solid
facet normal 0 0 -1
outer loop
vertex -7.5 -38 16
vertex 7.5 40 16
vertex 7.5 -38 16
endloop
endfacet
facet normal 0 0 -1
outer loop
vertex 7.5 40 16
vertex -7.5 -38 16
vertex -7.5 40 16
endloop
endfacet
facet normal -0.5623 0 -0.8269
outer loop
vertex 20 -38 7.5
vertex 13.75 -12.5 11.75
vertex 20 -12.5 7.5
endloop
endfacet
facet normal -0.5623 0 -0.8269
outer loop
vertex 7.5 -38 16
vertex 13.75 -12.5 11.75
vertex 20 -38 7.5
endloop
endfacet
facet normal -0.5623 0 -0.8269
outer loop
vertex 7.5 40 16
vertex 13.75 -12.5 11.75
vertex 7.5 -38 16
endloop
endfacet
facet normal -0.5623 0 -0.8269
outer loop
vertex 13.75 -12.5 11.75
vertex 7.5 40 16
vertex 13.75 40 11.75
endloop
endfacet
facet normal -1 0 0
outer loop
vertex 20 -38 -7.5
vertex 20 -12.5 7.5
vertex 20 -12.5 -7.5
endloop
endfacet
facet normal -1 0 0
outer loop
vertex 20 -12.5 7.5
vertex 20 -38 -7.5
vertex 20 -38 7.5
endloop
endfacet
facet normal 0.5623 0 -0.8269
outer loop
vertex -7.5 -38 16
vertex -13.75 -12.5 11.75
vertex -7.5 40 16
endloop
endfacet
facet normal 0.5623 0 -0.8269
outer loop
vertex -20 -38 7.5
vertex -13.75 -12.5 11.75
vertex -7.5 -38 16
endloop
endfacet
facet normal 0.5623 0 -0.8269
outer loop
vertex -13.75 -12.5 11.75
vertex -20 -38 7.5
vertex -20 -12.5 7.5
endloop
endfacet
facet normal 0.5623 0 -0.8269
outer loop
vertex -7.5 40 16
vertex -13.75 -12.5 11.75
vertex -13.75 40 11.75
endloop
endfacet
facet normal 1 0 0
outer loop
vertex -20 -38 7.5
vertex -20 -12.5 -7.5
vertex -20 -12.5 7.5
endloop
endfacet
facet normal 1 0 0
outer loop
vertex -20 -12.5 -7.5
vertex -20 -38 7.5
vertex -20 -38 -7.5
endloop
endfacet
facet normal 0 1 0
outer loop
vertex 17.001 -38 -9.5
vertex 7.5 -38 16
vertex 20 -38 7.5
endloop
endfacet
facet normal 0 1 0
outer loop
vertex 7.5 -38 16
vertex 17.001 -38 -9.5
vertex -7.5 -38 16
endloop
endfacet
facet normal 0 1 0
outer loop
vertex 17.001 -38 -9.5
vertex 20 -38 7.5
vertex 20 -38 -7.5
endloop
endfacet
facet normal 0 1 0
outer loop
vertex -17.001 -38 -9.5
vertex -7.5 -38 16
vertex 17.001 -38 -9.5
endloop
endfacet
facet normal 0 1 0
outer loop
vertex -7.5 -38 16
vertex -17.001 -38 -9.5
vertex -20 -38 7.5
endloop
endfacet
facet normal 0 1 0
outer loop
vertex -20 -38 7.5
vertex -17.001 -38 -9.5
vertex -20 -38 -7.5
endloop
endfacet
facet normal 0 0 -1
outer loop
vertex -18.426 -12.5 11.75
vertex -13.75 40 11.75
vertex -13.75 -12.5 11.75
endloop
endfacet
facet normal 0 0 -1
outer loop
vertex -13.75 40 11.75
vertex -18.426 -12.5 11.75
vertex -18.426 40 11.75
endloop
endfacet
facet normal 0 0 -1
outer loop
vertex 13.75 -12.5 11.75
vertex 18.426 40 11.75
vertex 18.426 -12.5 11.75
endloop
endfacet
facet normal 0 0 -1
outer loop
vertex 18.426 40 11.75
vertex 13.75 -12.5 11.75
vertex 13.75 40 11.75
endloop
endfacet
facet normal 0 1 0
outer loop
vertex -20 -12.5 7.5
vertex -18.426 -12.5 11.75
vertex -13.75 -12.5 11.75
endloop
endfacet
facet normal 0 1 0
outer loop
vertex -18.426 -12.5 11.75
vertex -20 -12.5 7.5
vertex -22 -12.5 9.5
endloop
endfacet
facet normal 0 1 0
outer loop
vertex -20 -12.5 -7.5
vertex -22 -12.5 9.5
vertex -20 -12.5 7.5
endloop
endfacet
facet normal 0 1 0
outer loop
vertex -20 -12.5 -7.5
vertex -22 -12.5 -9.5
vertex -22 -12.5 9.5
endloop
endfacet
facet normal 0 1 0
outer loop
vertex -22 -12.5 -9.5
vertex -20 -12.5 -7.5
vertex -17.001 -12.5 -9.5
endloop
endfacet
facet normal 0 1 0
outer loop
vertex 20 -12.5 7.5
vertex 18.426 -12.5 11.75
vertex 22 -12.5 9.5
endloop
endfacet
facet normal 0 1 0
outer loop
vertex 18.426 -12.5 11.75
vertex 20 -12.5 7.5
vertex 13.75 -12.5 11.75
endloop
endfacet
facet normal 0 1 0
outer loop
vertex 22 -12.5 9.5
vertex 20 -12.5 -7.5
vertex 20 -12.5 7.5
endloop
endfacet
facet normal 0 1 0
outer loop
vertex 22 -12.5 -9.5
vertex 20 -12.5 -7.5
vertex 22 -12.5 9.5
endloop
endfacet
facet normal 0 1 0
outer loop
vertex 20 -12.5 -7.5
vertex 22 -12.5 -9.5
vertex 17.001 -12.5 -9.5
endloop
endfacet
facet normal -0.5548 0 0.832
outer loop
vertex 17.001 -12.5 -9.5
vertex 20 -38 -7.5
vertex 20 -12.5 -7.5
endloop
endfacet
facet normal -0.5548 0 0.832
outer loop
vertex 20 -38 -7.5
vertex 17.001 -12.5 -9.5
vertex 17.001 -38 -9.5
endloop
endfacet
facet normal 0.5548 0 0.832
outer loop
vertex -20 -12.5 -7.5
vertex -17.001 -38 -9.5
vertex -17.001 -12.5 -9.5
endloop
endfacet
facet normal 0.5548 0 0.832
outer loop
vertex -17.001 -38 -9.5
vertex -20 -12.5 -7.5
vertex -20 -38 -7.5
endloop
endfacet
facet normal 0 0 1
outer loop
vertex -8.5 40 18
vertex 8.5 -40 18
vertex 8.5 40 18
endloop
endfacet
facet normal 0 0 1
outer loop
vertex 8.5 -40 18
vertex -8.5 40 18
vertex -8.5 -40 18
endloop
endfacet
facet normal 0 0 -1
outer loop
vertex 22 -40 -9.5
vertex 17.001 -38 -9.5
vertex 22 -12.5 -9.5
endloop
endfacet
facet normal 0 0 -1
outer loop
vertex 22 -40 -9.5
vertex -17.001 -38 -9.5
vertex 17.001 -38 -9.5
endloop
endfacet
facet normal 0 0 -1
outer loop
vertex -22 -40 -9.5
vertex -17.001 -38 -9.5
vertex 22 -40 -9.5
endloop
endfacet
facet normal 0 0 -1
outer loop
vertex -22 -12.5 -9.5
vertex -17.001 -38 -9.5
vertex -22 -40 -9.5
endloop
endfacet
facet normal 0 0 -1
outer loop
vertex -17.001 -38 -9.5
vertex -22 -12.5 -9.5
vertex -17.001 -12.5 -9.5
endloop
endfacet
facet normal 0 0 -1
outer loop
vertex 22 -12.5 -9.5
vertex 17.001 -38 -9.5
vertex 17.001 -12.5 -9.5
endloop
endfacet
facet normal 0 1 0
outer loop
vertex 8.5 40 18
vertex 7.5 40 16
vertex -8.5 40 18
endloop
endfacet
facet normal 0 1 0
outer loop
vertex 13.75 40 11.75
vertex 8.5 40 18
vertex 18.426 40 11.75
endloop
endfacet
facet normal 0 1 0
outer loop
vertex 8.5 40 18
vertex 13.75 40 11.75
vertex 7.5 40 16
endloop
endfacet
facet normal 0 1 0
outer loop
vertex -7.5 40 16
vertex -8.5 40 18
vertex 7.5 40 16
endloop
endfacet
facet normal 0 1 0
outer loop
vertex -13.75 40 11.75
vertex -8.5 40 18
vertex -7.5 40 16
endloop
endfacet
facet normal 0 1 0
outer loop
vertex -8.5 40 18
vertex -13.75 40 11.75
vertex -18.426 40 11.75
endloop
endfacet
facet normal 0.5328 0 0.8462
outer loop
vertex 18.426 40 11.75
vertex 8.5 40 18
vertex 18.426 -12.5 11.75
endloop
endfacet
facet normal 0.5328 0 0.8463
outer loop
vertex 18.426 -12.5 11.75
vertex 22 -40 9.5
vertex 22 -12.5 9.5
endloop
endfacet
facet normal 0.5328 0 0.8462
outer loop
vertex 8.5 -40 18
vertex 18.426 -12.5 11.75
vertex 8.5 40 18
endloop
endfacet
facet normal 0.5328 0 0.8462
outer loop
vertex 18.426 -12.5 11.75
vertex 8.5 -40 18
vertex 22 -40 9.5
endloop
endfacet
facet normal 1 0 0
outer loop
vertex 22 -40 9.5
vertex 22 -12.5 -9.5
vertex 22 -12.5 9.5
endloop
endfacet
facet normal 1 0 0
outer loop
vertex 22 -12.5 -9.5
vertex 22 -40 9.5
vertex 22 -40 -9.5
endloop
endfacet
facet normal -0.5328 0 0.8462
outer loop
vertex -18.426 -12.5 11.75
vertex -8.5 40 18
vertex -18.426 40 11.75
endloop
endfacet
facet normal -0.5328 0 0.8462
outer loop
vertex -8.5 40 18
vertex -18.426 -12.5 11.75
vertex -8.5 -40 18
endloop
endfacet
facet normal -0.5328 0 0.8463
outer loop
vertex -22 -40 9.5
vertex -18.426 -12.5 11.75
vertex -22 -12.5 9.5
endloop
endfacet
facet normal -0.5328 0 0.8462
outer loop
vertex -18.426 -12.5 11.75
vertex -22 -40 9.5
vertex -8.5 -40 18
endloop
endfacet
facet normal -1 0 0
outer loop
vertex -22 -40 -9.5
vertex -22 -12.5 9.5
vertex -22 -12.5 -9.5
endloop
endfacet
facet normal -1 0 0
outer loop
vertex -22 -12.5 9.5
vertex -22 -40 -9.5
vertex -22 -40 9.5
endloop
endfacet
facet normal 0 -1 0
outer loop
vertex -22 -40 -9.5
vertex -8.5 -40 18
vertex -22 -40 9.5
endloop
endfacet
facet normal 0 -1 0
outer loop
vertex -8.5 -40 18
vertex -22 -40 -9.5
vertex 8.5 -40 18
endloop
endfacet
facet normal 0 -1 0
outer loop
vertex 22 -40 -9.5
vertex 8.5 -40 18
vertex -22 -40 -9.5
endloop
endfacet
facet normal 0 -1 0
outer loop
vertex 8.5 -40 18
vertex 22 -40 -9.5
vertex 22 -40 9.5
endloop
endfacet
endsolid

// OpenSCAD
//use <./sc.scad>
t=2;
w1=40;
w2=15;
h1=15;
h2=16;
d1=20;
d2=80;
D(){hull(){
    Cu(w1+2*t,d2,h1+2*t);Tz(h2-h1/2)Cu(w2+t,d2,h1+2*t);}
    Ty(t)hull(){Cu(w1,d2,h1);Tz(h2-h1/2)Cu(w2,d2,h1);}
    Ty(d1)Cu(w1+3*t,d2-h1,h2+h1/2);
    T(0,t,-h1/2-t)hull(){Cu(w1-3*t,d2,0.001);Tz(t)Cu(w1,d2,0.001);}
    }
    
    // ShortCuts.scad 
// Autor: Rudolf Huttary, Berlin 2015
//
$fn = 50; 


//show_examples(); 

module show_examples()
	place_in_rect(30, 30)
	{
		Cy(h = 10); 
		CyH(h = 10); 
		CyH(h = 10, w = 30); 
		CyS(h = 10); 
		CyS(h = 10, w1 = 25, w2 = 75); 
		Cu(10); 
		Ri(h = 10); 
		RiH(h = 10); 
		RiS(h = 10, w1 = 10); 
		RiS(h = 10, w1 = 30, w2 = 300); 
		Sp(); 
		SpH(10, 30, 30); 
	}



module help()
{
echo("==============="); 
echo("help(): shows this help"); 
echo("show_examples(): shows some examples"); 
echo("place_in_rect(): places children objects in grid"); 
echo("Transformations:"); 
echo(" transform :  T(x=0, y=0, z=0), Tx(x=0) , Ty(y=0), Tz(z=0)"); 
echo(" rotate :  R(x=0, y=0, z=0), Rx(x=0) , Ry(y=0), Rz(z=0)"); 
echo(" scale :  S(x=1, y=1, z=1), Sx(x=1) , Sy(y=1), Sz(z=1)"); 
echo("Logical"); 
echo(" difference :  D()"); 
echo(" union :  U()"); 
echo(" intersection : *missing*"); 
echo("Primitives"); 
echo(" circle :  Ci(r=10)"); 
echo(" circle_half :  CiH(r=10, w=0)")
echo(" circle_segment :  CiS(r=10, w1=0, w2=90)")
echo(" square :  Sq(x=10, y=0, center=true))"); 
echo(" cylinder :  Cy(r=10, h=1, center=true)"); 
echo(" cylinder_half :  CyH(r=10, w=0)")
echo(" cylinder_segment: CyS(r=10, h=1, w1=0, w2=90,center=true)"); 
echo(" cylinder_segment: Pie(r=10, h=1, w1=0, w2=90,center=true)"); 
echo(" cube :  Cu(x=10, y=0, z=10, center=true)"); 
echo(" ring :  Ri(R=10, r=5, h=1, center=true)"); 
echo(" ring_half :  RiH(R=10, r=5, h=1, w=0 center=true)"); 
echo(" ring_segment :  RiS(R=10, r=5, h=1, w1=0, w2=90, center=true)"); 
echo(" sphere:  Sp(r=10))"); 
echo(" sphere_half:  SpH(r=10, w1 = 0, w2 = 0))"); 
echo("==============="); 
}


// Euclidean Transformations

module T(x=0, y=0, z=0){translate([x, y, z])children(); }
module Tx(x) { translate([x, 0, 0])children(); }
module Ty(y) { translate([0, y, 0])children(); }
module Tz(z) { translate([0, 0, z])children(); }


module R(x=0, y=0, z=0){rotate([x, y, z]) children();}
module Rx(x=90){rotate([x, 0, 0]) children();}
module Ry(y=90){rotate([0, y, 0]) children();}
module Rz(z=90){rotate([0, 0, z]) children();}

module S(x=1, y=1, z=1){scale([x, y, z]) children();}
module Sx(x=1){scale([x, 1, 1]) children();}
module Sy(y=1){scale([1, y, 1]) children();}
module Sz(z=1){scale([1, 1, z]) children();}


module D() difference(){children(0); children([1:$children-1]);}
module U() children([0:$children-1]);
// module I() intersection()children([0:$children-1]); // does not work for some reason


// primitives - 2D

module Sq(x =10, y = 0, center = true)
{
   if(y==0)
		square([x, x], center = center); 
	else
		square([x, y], center = center); 
}
module Ci(r = 10)
{
	circle(r = r); 
}

// derived primitives - 2d
module CiH(r = 10, w = 0)
  circle_half(r, w); 

module CiS(r = 10, w1 = 0, w2 = 90)
  circle_segment(r, w1, w2); 


// primitives - 3d
module Cy(r = 10, h = 1, center = true)
{
	cylinder(r = r, h = h, center = center); 
}
module Cu(x = 10, y = 0, z = 10, center = true)
{
  if (y==0)
	cube([x, x, x], center = center); 
  else
	cube([x, y, z], center = center); 
}

// derived primitives - 3d
module CyH(r = 10, h = 1, w = 0, center = true)
  cylinder_half(r, h, w, center); 

module CyS(r = 10, h = 1, w1 = 0, w2 = 90, center = true)
  cylinder_segment(r, h, w1, w2, center); 

module Ri(R = 10, r = 5, h = 1, center = true)
  ring(R, r, h, center); 

module RiS(R = 10, r = 5, h = 1, w1 = 0, w2 = 90, center = true)
   ring_segment(R, r, h, w1, w2, center); 

module RiH(r1 = 10, r2, h = 1, w = 0, center = true)
   ring_half(r1, r2, h, w, center); 
module Pie(r = 10, h = 1, w1 = 0, w2 = 90, center = true)
  cylinder_segment(r, h, w1, w2, center);  
module Sp(r = 10)
  sphere(r); 
module SpH(r = 10, w1 = 0, w2 = 0)
  sphere_half(r, w1, w2); 
module SpS(r = 10, w1 = 0, w2 = 90, w3 = 90)
  sphere_segment(r, w1, w2); 




// clear text definitions
module circle_half(r = 10, w = 0)
{
	difference()
	{
		circle(r); 
     rotate([0, 0, w-90])
     translate([0, -r])
		square([r, 2*r], center = false); 
	}
}

module circle_segment(r = 10, w1 = 0, w2 = 90)
{
  W2 = (w1>w2)?w2+360:w2; 
  if (W2-w1 < 180)
    intersection()
		{
       circle_half(r, w1); 
       circle_half(r, W2-180); 
 		}
	else
    union()
		{
       circle_half(r, w1); 
       circle_half(r, W2-180); 
 		}
}

module cylinder_half(r = 10, h = 1, w = 0, center = true)
{
  linear_extrude(height = h, center = center)
  circle_half(r, w); 
} 

module cylinder_segment(r = 10, h = 1, w1 = 0, w2 = 90, center = true)
{
  linear_extrude(height = h, center = center)
  circle_segment(r, w1, w2); 
} 

module ring(R = 10, r = 5, h = 1, center = true)
{
	difference()
	{
	cylinder(r = R, h = h, center = center); 
   translate([0, 0, -2*h])
	cylinder(r = r, h = 4*h, center = false); 
	}
}

module ring_half(R = 10, r = 5, h = 1, w = 0, center = true)
{
	difference()
	{
		ring(R, r, h, center); 
     rotate([0, 0, w])
     translate([0, -R/2, 0])
		cube([2*R, R, 3*h], center = true); 
	}
}

module ring_segment(R = 10, r = 5, h = 1, w1 = 0, w2 = 90, center = true)
{
  W2 = (w1>w2)?w2+360:w2; 
  if (W2-w1 < 180)
    intersection()
		{
       ring_half(R, r, h, w1, center); 
       ring_half(R, r, h, W2-180, center); 
 		}
	else
    union()
		{
       ring_half(R, r, h, w1, center); 
       ring_half(R, r, h, W2-180, center); 
 		}
}


module sphere_half(r = 10, w1 = 0, w2 = 0)
{  
	difference()
	{
   	sphere(r); 
      rotate([-w1, -w2, 0])
     	translate([0, 0, r])
		cube(2*r, 2*r, r, center = true); 
	}

}


// additional code
module place_in_rect(dx =20, dy=20)
{
  cols = ceil(sqrt($children)); 
  rows = floor(sqrt($children)); 
  for(i = [0:$children-1])
	{ 
	  T(dx*(-cols/2+(i%cols)+.5), dy*(rows/2-floor(i/cols)-.5))
		 children(i); 
	}
}
